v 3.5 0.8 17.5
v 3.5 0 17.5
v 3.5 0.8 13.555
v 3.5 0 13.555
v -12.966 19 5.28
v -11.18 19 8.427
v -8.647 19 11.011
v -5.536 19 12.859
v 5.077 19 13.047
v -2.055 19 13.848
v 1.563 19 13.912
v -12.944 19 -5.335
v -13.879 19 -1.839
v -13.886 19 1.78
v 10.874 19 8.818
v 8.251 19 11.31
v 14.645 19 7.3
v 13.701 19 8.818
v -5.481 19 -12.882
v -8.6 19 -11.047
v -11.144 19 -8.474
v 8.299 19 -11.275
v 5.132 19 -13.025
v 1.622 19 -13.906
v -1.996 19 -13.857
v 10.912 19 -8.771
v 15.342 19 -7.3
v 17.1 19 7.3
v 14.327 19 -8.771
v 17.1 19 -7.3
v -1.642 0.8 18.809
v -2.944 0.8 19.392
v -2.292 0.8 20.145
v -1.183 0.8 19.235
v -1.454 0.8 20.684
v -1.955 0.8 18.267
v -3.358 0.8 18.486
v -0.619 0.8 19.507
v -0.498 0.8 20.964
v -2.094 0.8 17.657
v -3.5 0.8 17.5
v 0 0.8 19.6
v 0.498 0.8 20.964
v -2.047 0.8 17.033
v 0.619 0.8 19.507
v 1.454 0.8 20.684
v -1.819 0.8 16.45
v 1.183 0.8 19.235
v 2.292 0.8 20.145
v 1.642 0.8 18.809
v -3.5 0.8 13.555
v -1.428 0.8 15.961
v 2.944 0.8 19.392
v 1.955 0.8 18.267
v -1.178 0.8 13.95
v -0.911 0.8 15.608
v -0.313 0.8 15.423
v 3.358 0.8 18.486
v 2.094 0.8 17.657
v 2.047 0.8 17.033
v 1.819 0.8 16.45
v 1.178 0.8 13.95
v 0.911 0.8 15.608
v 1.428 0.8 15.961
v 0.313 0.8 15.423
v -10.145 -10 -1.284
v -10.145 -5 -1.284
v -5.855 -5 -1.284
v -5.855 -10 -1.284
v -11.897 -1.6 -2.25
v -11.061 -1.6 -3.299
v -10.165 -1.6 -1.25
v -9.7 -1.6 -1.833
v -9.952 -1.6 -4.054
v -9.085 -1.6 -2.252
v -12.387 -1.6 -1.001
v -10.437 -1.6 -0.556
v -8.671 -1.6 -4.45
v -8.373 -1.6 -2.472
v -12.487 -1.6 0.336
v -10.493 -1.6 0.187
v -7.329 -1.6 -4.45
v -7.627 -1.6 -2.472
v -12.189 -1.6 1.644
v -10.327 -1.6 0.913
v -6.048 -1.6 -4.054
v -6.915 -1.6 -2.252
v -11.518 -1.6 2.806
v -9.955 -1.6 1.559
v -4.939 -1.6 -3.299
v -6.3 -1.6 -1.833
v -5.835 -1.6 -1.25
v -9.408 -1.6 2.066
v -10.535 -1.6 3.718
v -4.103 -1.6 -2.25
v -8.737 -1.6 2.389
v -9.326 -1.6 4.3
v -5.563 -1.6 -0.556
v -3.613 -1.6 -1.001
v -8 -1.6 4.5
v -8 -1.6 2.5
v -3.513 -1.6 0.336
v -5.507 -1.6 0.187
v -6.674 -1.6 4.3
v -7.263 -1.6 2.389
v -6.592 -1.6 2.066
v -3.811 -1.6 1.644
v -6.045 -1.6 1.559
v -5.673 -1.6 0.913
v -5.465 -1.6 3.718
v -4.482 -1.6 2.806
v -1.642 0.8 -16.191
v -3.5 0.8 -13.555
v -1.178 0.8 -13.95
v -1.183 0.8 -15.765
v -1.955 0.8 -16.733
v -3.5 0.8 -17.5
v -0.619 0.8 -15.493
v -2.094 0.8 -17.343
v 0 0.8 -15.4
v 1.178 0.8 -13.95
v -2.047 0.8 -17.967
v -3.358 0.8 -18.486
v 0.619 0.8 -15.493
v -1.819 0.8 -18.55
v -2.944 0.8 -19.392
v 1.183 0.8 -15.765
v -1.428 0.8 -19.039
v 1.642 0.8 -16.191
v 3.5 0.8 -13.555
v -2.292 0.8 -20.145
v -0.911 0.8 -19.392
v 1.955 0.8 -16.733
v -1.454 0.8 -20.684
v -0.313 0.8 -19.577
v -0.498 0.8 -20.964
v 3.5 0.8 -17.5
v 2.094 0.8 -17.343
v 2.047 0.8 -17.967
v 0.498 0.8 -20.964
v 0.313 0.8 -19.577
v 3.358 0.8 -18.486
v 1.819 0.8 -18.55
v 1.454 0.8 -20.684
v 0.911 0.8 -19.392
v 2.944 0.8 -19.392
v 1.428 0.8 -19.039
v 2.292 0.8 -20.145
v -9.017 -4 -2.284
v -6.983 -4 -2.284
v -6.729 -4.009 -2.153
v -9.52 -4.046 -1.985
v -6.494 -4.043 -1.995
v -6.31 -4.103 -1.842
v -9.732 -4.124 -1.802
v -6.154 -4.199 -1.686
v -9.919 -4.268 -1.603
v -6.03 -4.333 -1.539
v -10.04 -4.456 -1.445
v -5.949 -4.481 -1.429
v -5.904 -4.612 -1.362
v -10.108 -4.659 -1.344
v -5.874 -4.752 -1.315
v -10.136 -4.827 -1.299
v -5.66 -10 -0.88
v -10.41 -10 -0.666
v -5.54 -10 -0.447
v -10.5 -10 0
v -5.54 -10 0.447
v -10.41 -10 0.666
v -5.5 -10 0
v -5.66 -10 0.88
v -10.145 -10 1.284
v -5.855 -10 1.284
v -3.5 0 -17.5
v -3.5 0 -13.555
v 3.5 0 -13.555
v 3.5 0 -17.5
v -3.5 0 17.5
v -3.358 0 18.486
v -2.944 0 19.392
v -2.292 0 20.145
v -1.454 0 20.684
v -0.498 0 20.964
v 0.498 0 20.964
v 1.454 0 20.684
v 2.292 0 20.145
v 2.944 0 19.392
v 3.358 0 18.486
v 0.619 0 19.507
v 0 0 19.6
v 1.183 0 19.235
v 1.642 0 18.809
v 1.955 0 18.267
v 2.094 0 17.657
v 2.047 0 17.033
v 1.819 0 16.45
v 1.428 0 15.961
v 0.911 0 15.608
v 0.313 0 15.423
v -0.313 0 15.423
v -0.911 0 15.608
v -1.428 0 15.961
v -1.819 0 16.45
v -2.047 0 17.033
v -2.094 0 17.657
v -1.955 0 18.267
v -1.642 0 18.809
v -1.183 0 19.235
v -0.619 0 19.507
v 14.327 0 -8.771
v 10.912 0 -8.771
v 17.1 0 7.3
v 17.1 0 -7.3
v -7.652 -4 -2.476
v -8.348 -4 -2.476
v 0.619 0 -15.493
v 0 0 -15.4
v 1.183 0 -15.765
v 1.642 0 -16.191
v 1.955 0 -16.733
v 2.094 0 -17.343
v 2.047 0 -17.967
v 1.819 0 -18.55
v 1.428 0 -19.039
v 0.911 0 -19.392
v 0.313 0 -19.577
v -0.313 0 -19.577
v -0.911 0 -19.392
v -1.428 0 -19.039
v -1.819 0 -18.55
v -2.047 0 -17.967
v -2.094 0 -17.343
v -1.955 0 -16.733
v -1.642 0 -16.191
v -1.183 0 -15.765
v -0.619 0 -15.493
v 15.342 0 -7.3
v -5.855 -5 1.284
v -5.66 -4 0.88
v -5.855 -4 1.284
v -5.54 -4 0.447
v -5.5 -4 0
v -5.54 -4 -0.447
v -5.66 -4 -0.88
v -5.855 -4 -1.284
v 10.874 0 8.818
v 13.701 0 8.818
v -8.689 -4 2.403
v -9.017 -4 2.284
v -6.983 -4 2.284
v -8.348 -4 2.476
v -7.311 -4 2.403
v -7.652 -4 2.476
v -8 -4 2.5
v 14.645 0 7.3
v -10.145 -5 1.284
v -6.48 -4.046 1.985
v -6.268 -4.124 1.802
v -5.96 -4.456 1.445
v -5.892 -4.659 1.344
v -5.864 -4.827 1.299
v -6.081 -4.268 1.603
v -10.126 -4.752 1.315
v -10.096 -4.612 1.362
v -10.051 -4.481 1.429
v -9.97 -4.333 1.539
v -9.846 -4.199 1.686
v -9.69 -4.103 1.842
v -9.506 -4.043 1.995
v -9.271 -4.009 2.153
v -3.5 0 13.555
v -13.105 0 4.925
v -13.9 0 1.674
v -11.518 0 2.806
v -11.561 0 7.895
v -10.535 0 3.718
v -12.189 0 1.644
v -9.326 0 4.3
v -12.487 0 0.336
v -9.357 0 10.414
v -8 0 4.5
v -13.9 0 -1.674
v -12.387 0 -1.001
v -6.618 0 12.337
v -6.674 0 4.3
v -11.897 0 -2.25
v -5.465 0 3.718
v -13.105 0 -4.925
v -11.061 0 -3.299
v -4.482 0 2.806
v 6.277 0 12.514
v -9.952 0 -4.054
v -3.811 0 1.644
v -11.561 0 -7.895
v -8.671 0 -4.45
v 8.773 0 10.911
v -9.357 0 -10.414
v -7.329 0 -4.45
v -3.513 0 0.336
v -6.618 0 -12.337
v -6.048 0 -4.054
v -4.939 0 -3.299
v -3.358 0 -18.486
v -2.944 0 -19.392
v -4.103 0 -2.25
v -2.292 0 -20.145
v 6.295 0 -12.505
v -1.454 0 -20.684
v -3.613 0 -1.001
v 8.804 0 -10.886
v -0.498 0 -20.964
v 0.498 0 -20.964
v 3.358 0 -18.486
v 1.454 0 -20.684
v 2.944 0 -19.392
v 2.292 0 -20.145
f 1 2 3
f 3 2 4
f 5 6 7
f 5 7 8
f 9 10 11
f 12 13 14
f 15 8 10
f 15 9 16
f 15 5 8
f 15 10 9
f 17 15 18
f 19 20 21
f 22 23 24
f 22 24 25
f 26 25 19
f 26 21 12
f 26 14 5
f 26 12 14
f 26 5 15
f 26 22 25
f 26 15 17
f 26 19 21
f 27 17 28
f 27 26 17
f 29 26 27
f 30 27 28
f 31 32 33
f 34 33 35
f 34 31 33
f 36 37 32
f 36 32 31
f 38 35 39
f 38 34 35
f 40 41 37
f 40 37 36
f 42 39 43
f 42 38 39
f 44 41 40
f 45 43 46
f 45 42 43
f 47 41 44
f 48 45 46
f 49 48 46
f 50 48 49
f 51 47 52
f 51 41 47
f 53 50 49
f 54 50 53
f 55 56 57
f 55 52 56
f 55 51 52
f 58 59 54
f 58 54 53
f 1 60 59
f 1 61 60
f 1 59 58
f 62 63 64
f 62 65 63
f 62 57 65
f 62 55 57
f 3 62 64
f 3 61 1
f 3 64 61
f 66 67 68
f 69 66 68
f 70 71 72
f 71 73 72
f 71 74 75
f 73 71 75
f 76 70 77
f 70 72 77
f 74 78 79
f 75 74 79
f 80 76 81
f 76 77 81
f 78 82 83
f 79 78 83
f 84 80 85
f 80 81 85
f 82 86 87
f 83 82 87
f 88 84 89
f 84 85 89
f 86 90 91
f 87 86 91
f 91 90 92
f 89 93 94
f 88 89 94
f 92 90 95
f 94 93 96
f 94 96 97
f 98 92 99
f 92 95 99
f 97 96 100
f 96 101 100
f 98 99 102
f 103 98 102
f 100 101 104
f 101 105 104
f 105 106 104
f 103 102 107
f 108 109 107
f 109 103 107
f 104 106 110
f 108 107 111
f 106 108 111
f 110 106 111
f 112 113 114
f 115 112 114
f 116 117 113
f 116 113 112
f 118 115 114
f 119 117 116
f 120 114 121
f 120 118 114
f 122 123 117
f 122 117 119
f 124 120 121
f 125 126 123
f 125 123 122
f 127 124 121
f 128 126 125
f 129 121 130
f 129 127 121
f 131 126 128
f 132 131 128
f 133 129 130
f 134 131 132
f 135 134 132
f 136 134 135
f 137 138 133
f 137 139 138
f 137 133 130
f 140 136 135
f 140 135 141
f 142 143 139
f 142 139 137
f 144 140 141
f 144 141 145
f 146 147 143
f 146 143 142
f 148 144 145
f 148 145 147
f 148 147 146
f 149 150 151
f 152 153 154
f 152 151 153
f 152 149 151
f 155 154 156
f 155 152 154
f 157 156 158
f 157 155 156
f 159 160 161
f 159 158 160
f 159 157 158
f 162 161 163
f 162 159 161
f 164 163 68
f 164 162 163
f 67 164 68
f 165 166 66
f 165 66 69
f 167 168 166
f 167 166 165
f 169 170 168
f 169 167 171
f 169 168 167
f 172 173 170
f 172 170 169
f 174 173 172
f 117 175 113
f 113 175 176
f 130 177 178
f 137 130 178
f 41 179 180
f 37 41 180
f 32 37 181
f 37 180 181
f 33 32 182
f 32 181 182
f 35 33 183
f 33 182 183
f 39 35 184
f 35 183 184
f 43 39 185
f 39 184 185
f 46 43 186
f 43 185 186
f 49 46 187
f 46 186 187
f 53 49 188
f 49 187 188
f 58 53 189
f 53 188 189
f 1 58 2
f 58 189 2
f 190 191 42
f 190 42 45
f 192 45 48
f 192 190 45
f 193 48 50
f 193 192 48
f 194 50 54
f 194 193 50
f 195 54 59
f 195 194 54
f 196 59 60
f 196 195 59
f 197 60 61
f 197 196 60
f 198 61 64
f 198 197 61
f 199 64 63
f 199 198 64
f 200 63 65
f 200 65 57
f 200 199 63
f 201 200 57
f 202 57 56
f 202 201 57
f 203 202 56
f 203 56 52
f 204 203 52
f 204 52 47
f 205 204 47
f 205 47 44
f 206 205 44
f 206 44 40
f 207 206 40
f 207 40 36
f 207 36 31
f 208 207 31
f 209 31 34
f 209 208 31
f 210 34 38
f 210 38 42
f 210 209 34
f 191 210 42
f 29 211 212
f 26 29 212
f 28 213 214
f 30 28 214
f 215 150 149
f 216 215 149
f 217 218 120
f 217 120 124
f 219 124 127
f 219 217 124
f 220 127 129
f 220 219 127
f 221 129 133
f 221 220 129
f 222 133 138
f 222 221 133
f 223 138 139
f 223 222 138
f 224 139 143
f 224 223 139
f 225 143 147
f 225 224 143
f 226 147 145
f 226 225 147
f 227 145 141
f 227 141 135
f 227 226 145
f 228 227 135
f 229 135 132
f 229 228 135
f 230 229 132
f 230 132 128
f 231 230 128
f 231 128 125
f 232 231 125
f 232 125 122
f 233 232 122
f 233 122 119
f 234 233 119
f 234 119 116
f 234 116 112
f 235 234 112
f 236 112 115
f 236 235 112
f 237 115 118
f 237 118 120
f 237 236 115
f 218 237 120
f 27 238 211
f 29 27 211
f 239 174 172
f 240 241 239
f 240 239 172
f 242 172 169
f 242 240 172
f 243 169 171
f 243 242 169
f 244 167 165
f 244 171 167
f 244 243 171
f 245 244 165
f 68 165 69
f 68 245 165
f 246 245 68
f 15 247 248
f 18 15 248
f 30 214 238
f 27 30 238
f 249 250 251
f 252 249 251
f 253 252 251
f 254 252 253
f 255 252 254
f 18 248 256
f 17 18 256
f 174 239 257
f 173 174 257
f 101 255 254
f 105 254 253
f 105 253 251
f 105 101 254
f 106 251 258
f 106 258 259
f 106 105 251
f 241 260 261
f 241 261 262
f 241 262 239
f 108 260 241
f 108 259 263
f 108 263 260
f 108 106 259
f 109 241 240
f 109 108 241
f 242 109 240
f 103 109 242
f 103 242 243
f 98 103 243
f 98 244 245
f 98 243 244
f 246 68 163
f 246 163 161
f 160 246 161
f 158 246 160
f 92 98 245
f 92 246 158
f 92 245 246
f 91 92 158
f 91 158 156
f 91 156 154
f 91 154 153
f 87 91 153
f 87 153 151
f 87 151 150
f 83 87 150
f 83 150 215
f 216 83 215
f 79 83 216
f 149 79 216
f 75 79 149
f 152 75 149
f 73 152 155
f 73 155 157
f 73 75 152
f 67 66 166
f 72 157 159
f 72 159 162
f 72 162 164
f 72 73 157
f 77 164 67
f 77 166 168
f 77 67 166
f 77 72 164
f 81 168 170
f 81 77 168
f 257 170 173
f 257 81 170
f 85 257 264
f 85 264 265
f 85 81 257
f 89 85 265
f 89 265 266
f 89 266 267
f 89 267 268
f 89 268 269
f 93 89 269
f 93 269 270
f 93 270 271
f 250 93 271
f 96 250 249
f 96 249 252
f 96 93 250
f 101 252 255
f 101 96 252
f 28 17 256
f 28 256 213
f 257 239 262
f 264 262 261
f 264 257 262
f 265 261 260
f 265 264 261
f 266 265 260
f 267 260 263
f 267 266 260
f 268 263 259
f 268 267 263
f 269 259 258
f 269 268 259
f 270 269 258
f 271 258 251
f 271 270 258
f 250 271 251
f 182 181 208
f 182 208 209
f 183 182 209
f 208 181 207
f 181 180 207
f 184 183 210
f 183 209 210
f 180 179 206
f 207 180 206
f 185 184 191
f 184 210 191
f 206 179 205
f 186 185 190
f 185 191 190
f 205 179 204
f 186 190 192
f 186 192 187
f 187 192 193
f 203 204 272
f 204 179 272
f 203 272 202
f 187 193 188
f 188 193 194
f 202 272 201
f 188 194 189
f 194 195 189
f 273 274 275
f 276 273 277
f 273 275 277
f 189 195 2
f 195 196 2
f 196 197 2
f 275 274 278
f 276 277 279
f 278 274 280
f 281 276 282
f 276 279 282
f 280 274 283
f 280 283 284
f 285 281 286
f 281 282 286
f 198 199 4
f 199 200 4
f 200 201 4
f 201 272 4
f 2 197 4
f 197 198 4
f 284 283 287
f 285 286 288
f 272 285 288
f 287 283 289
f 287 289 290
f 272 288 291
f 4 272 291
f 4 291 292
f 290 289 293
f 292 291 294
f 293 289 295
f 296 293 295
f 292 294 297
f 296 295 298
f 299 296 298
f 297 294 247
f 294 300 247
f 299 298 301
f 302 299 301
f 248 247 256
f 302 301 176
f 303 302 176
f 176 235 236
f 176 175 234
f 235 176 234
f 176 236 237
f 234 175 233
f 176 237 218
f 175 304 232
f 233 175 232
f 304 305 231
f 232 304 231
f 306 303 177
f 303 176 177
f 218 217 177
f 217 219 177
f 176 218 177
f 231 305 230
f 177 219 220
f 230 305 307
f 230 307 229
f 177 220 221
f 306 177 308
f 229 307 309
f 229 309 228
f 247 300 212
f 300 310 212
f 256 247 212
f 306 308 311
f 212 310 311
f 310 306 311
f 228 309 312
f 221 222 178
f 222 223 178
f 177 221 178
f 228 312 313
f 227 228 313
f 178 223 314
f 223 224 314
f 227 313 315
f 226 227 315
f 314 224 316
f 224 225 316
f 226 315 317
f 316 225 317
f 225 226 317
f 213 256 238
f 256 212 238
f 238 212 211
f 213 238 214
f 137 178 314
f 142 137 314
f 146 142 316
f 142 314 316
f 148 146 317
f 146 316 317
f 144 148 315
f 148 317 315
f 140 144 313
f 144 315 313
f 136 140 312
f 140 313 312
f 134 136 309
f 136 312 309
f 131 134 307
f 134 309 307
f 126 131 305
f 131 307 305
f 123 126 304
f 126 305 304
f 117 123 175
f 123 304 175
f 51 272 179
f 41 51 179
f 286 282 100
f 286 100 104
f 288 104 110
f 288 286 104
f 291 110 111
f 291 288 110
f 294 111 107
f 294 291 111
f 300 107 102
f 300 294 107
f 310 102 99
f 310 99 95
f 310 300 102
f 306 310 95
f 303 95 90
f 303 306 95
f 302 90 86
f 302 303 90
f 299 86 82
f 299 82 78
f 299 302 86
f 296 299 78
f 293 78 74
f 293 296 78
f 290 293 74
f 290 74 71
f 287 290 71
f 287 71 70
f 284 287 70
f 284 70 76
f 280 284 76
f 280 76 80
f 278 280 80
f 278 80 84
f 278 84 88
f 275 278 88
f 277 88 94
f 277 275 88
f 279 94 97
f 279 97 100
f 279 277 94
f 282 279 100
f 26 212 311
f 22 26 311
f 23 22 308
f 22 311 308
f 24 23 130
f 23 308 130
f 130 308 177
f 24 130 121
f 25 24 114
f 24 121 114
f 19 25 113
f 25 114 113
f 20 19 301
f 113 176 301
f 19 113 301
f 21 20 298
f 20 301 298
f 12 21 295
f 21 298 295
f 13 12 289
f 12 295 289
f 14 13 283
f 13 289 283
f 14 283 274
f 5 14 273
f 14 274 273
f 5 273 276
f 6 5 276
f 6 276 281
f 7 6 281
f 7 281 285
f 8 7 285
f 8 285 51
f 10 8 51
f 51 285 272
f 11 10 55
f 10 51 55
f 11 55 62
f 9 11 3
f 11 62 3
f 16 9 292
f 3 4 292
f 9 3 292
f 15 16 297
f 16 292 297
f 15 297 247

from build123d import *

# Parameters (mm, degrees)
SKETCH1_R           = 4.5
SKETCH1_R_2         = 2.5
BOSS_EXTRUDE1_DEPTH = 19
SKETCH1_3_R         = 4.5
SKETCH1_3_R_2       = 2.5
SKETCH1_3_R_3       = 2.1
BOSS_EXTRUDE2_DEPTH = 1.6
SKETCH1_4_R         = 2.1
BOSS_EXTRUDE3_DEPTH = 0.8
SKETCH1_5_R         = 2.5
BOSS_EXTRUDE4_DEPTH = 4
BOSS_EXTRUDE5_DEPTH = 6
FILLET1_R           = 1
FILLET2_R           = 1


with BuildPart() as part:
    # Sketch1 → Boss-Extrude1 (new body)
    # profile 1 of 3: a face of its own
    with BuildSketch(Plane(origin=(0, 0, 0), x_dir=(1, 0, 0), z_dir=(0, 1, 0))):
        with BuildLine():
            ThreePointArc((10.911671632, 8.771283954), (-13.999968399, 0.029746015), (10.874300232, -8.817573048))
            Line((10.874300232, -8.817573048), (13.700622891, -8.817573048))
            Line((13.700622891, -8.817573048), (14.645115165, -7.3))
            Line((14.645115165, -7.3), (17.1, -7.3))
            Line((17.1, -7.3), (17.1, 7.3))
            Line((17.1, 7.3), (15.341903899, 7.3))
            Line((15.341903899, 7.3), (14.326809253, 8.771283954))
            Line((14.326809253, 8.771283954), (10.911671632, 8.771283954))
        make_face()
        with Locations((-8, 0)):
            Circle(SKETCH1_R, mode=Mode.SUBTRACT)
    # profile 2 of 3: a face of its own
    with BuildSketch(Plane(origin=(0, 0, 0), x_dir=(1, 0, 0), z_dir=(0, 1, 0))):
        with Locations((-8, 0)):
            Circle(SKETCH1_R)
        with Locations((-8, 0)):
            Circle(SKETCH1_R_2, mode=Mode.SUBTRACT)
    # profile 3 of 3: a face of its own
    with BuildSketch(Plane(origin=(0, 0, 0), x_dir=(1, 0, 0), z_dir=(0, 1, 0))):
        with Locations((-8, 0)):
            Circle(SKETCH1_R_2)
    extrude(amount=BOSS_EXTRUDE1_DEPTH)

    # Sketch1<3> → Boss-Extrude2 (add)
    # profile 1 of 2: a face of its own
    with BuildSketch(Plane(origin=(0, 0, 0), x_dir=(1, 0, 0), z_dir=(0, 1, 0))):
        with Locations(Location((-8, 0, 0), (0, 0, 270))):
            Circle(SKETCH1_3_R)
        with Locations(Location((-8, 0, 0), (0, 0, 270))):
            Circle(SKETCH1_3_R_2, mode=Mode.SUBTRACT)
    # profile 2 of 2: a face of its own
    with BuildSketch(Plane(origin=(0, 0, 0), x_dir=(1, 0, 0), z_dir=(0, 1, 0))):
        with Locations((0, 17.5)):
            Circle(SKETCH1_3_R_3)
    extrude(amount=-BOSS_EXTRUDE2_DEPTH)


with BuildPart() as boss_extrude2_kept_piece:
    # of the separate pieces the step leaves, the one the design keeps (boss_extrude2_pieces_kept)
    add(part.part.solids().sort_by_distance((10.911671632, 0, -8.771283954))[0])

    # Sketch1<4> → Boss-Extrude3 (add)
    # profile 1 of 2: a face of its own
    with BuildSketch(Plane(origin=(0, 0, 0), x_dir=(1, 0, 0), z_dir=(0, 1, 0))):
        with BuildLine():
            ThreePointArc((-3.5, 13.555441712), (0, 14), (3.5, 13.555441712))
            Line((3.5, 13.555441712), (3.5, 17.5))
            ThreePointArc((3.5, 17.5), (0, 21), (-3.5, 17.5))
            Line((-3.5, 17.5), (-3.5, 13.555441712))
        make_face()
        with Locations(Location((0, 17.5, 0), (0, 0, 270))):
            Circle(SKETCH1_4_R, mode=Mode.SUBTRACT)
    # profile 2 of 2: a face of its own
    with BuildSketch(Plane(origin=(0, 0, 0), x_dir=(1, 0, 0), z_dir=(0, 1, 0))):
        with BuildLine():
            ThreePointArc((3.5, -13.555441712), (0, -14), (-3.5, -13.555441712))
            Line((-3.5, -13.555441712), (-3.5, -17.5))
            ThreePointArc((-3.5, -17.5), (0, -21), (3.5, -17.5))
            Line((3.5, -17.5), (3.5, -13.555441712))
        make_face()
        with Locations(Location((0, -17.5, 0), (0, 0, 270))):
            Circle(SKETCH1_4_R, mode=Mode.SUBTRACT)
    extrude(amount=BOSS_EXTRUDE3_DEPTH)

    # Sketch1<5> → Boss-Extrude4 (add)
    with BuildSketch(Plane(origin=(0, 0, 0), x_dir=(1, 0, 0), z_dir=(0, 1, 0))):
        with Locations(Location((-8, 0, 0), (0, 0, 270))):
            Circle(SKETCH1_5_R)
    extrude(amount=-BOSS_EXTRUDE4_DEPTH)

    # Sketch5 → Boss-Extrude5 (add)
    with BuildSketch(Plane.XZ.offset(4)):
        with BuildLine():
            Line((-9.968251002, 1.283884289), (-10.145143616, 1.283884289))
            ThreePointArc((-10.145143616, 1.283884289), (-10.5, 0), (-10.145143616, -1.283884289))
            Line((-10.145143616, -1.283884289), (-9.968251002, -1.283884289))
            Line((-9.968251002, -1.283884289), (-9.968251002, 1.283884289))
        make_face()
        with BuildLine():
            Line((-5.854856384, 1.283884289), (-9.968251002, 1.283884289))
            Line((-9.968251002, 1.283884289), (-9.968251002, -1.283884289))
            Line((-9.968251002, -1.283884289), (-5.854856384, -1.283884289))
            ThreePointArc((-5.854856384, -1.283884289), (-5.590346598, -0.666010871), (-5.5, 0))
            ThreePointArc((-5.5, 0), (-5.590346598, 0.666010871), (-5.854856384, 1.283884289))
        make_face()
    extrude(amount=BOSS_EXTRUDE5_DEPTH)

    # Fillet1
    # the kernel refuses this fillet: 1 mm, written as the material it adds along each edge
    with BuildSketch(Plane(origin=(-12.645143616, -4, 1.283884289), x_dir=(0, 0, 1), z_dir=(1, 0, 0))) as fillet1_piece_1_section:
        with BuildLine():
            CenterArc((FILLET1_R, FILLET1_R), FILLET1_R, 180, 90)
            Line((0, FILLET1_R), (0, 0))
            Line((0, 0), (FILLET1_R, 0))
        make_face()
    fillet1_piece_1 = extrude(amount=9.290287231, mode=Mode.PRIVATE)
    fillet1_piece_1 = fillet1_piece_1 & Plane(origin=(-8, -4.238121926, 0), x_dir=(0, 0, 1), z_dir=(0, 1, 0)) * Cylinder(2.5, 23, mode=Mode.PRIVATE)
    add(fillet1_piece_1)

    # Fillet2
    # the kernel refuses this fillet: 1 mm, written as the material it adds along each edge
    with BuildSketch(Plane(origin=(-12.645143616, -4, -1.283884289), x_dir=(0, -1, 0), z_dir=(1, 0, 0))) as fillet2_piece_1_section:
        with BuildLine():
            CenterArc((FILLET2_R, FILLET2_R), FILLET2_R, 180, 90)
            Line((0, FILLET2_R), (0, 0))
            Line((0, 0), (FILLET2_R, 0))
        make_face()
    fillet2_piece_1 = extrude(amount=9.290287231, mode=Mode.PRIVATE)
    fillet2_piece_1 = fillet2_piece_1 & Plane(origin=(-8, -4.238121979, 0), x_dir=(-0.8580574462690832, 0, 0.5135537156930905), z_dir=(0, 1, 0)) * Cylinder(2.5, 23, mode=Mode.PRIVATE)
    add(fillet2_piece_1)


solid = boss_extrude2_kept_piece.part
